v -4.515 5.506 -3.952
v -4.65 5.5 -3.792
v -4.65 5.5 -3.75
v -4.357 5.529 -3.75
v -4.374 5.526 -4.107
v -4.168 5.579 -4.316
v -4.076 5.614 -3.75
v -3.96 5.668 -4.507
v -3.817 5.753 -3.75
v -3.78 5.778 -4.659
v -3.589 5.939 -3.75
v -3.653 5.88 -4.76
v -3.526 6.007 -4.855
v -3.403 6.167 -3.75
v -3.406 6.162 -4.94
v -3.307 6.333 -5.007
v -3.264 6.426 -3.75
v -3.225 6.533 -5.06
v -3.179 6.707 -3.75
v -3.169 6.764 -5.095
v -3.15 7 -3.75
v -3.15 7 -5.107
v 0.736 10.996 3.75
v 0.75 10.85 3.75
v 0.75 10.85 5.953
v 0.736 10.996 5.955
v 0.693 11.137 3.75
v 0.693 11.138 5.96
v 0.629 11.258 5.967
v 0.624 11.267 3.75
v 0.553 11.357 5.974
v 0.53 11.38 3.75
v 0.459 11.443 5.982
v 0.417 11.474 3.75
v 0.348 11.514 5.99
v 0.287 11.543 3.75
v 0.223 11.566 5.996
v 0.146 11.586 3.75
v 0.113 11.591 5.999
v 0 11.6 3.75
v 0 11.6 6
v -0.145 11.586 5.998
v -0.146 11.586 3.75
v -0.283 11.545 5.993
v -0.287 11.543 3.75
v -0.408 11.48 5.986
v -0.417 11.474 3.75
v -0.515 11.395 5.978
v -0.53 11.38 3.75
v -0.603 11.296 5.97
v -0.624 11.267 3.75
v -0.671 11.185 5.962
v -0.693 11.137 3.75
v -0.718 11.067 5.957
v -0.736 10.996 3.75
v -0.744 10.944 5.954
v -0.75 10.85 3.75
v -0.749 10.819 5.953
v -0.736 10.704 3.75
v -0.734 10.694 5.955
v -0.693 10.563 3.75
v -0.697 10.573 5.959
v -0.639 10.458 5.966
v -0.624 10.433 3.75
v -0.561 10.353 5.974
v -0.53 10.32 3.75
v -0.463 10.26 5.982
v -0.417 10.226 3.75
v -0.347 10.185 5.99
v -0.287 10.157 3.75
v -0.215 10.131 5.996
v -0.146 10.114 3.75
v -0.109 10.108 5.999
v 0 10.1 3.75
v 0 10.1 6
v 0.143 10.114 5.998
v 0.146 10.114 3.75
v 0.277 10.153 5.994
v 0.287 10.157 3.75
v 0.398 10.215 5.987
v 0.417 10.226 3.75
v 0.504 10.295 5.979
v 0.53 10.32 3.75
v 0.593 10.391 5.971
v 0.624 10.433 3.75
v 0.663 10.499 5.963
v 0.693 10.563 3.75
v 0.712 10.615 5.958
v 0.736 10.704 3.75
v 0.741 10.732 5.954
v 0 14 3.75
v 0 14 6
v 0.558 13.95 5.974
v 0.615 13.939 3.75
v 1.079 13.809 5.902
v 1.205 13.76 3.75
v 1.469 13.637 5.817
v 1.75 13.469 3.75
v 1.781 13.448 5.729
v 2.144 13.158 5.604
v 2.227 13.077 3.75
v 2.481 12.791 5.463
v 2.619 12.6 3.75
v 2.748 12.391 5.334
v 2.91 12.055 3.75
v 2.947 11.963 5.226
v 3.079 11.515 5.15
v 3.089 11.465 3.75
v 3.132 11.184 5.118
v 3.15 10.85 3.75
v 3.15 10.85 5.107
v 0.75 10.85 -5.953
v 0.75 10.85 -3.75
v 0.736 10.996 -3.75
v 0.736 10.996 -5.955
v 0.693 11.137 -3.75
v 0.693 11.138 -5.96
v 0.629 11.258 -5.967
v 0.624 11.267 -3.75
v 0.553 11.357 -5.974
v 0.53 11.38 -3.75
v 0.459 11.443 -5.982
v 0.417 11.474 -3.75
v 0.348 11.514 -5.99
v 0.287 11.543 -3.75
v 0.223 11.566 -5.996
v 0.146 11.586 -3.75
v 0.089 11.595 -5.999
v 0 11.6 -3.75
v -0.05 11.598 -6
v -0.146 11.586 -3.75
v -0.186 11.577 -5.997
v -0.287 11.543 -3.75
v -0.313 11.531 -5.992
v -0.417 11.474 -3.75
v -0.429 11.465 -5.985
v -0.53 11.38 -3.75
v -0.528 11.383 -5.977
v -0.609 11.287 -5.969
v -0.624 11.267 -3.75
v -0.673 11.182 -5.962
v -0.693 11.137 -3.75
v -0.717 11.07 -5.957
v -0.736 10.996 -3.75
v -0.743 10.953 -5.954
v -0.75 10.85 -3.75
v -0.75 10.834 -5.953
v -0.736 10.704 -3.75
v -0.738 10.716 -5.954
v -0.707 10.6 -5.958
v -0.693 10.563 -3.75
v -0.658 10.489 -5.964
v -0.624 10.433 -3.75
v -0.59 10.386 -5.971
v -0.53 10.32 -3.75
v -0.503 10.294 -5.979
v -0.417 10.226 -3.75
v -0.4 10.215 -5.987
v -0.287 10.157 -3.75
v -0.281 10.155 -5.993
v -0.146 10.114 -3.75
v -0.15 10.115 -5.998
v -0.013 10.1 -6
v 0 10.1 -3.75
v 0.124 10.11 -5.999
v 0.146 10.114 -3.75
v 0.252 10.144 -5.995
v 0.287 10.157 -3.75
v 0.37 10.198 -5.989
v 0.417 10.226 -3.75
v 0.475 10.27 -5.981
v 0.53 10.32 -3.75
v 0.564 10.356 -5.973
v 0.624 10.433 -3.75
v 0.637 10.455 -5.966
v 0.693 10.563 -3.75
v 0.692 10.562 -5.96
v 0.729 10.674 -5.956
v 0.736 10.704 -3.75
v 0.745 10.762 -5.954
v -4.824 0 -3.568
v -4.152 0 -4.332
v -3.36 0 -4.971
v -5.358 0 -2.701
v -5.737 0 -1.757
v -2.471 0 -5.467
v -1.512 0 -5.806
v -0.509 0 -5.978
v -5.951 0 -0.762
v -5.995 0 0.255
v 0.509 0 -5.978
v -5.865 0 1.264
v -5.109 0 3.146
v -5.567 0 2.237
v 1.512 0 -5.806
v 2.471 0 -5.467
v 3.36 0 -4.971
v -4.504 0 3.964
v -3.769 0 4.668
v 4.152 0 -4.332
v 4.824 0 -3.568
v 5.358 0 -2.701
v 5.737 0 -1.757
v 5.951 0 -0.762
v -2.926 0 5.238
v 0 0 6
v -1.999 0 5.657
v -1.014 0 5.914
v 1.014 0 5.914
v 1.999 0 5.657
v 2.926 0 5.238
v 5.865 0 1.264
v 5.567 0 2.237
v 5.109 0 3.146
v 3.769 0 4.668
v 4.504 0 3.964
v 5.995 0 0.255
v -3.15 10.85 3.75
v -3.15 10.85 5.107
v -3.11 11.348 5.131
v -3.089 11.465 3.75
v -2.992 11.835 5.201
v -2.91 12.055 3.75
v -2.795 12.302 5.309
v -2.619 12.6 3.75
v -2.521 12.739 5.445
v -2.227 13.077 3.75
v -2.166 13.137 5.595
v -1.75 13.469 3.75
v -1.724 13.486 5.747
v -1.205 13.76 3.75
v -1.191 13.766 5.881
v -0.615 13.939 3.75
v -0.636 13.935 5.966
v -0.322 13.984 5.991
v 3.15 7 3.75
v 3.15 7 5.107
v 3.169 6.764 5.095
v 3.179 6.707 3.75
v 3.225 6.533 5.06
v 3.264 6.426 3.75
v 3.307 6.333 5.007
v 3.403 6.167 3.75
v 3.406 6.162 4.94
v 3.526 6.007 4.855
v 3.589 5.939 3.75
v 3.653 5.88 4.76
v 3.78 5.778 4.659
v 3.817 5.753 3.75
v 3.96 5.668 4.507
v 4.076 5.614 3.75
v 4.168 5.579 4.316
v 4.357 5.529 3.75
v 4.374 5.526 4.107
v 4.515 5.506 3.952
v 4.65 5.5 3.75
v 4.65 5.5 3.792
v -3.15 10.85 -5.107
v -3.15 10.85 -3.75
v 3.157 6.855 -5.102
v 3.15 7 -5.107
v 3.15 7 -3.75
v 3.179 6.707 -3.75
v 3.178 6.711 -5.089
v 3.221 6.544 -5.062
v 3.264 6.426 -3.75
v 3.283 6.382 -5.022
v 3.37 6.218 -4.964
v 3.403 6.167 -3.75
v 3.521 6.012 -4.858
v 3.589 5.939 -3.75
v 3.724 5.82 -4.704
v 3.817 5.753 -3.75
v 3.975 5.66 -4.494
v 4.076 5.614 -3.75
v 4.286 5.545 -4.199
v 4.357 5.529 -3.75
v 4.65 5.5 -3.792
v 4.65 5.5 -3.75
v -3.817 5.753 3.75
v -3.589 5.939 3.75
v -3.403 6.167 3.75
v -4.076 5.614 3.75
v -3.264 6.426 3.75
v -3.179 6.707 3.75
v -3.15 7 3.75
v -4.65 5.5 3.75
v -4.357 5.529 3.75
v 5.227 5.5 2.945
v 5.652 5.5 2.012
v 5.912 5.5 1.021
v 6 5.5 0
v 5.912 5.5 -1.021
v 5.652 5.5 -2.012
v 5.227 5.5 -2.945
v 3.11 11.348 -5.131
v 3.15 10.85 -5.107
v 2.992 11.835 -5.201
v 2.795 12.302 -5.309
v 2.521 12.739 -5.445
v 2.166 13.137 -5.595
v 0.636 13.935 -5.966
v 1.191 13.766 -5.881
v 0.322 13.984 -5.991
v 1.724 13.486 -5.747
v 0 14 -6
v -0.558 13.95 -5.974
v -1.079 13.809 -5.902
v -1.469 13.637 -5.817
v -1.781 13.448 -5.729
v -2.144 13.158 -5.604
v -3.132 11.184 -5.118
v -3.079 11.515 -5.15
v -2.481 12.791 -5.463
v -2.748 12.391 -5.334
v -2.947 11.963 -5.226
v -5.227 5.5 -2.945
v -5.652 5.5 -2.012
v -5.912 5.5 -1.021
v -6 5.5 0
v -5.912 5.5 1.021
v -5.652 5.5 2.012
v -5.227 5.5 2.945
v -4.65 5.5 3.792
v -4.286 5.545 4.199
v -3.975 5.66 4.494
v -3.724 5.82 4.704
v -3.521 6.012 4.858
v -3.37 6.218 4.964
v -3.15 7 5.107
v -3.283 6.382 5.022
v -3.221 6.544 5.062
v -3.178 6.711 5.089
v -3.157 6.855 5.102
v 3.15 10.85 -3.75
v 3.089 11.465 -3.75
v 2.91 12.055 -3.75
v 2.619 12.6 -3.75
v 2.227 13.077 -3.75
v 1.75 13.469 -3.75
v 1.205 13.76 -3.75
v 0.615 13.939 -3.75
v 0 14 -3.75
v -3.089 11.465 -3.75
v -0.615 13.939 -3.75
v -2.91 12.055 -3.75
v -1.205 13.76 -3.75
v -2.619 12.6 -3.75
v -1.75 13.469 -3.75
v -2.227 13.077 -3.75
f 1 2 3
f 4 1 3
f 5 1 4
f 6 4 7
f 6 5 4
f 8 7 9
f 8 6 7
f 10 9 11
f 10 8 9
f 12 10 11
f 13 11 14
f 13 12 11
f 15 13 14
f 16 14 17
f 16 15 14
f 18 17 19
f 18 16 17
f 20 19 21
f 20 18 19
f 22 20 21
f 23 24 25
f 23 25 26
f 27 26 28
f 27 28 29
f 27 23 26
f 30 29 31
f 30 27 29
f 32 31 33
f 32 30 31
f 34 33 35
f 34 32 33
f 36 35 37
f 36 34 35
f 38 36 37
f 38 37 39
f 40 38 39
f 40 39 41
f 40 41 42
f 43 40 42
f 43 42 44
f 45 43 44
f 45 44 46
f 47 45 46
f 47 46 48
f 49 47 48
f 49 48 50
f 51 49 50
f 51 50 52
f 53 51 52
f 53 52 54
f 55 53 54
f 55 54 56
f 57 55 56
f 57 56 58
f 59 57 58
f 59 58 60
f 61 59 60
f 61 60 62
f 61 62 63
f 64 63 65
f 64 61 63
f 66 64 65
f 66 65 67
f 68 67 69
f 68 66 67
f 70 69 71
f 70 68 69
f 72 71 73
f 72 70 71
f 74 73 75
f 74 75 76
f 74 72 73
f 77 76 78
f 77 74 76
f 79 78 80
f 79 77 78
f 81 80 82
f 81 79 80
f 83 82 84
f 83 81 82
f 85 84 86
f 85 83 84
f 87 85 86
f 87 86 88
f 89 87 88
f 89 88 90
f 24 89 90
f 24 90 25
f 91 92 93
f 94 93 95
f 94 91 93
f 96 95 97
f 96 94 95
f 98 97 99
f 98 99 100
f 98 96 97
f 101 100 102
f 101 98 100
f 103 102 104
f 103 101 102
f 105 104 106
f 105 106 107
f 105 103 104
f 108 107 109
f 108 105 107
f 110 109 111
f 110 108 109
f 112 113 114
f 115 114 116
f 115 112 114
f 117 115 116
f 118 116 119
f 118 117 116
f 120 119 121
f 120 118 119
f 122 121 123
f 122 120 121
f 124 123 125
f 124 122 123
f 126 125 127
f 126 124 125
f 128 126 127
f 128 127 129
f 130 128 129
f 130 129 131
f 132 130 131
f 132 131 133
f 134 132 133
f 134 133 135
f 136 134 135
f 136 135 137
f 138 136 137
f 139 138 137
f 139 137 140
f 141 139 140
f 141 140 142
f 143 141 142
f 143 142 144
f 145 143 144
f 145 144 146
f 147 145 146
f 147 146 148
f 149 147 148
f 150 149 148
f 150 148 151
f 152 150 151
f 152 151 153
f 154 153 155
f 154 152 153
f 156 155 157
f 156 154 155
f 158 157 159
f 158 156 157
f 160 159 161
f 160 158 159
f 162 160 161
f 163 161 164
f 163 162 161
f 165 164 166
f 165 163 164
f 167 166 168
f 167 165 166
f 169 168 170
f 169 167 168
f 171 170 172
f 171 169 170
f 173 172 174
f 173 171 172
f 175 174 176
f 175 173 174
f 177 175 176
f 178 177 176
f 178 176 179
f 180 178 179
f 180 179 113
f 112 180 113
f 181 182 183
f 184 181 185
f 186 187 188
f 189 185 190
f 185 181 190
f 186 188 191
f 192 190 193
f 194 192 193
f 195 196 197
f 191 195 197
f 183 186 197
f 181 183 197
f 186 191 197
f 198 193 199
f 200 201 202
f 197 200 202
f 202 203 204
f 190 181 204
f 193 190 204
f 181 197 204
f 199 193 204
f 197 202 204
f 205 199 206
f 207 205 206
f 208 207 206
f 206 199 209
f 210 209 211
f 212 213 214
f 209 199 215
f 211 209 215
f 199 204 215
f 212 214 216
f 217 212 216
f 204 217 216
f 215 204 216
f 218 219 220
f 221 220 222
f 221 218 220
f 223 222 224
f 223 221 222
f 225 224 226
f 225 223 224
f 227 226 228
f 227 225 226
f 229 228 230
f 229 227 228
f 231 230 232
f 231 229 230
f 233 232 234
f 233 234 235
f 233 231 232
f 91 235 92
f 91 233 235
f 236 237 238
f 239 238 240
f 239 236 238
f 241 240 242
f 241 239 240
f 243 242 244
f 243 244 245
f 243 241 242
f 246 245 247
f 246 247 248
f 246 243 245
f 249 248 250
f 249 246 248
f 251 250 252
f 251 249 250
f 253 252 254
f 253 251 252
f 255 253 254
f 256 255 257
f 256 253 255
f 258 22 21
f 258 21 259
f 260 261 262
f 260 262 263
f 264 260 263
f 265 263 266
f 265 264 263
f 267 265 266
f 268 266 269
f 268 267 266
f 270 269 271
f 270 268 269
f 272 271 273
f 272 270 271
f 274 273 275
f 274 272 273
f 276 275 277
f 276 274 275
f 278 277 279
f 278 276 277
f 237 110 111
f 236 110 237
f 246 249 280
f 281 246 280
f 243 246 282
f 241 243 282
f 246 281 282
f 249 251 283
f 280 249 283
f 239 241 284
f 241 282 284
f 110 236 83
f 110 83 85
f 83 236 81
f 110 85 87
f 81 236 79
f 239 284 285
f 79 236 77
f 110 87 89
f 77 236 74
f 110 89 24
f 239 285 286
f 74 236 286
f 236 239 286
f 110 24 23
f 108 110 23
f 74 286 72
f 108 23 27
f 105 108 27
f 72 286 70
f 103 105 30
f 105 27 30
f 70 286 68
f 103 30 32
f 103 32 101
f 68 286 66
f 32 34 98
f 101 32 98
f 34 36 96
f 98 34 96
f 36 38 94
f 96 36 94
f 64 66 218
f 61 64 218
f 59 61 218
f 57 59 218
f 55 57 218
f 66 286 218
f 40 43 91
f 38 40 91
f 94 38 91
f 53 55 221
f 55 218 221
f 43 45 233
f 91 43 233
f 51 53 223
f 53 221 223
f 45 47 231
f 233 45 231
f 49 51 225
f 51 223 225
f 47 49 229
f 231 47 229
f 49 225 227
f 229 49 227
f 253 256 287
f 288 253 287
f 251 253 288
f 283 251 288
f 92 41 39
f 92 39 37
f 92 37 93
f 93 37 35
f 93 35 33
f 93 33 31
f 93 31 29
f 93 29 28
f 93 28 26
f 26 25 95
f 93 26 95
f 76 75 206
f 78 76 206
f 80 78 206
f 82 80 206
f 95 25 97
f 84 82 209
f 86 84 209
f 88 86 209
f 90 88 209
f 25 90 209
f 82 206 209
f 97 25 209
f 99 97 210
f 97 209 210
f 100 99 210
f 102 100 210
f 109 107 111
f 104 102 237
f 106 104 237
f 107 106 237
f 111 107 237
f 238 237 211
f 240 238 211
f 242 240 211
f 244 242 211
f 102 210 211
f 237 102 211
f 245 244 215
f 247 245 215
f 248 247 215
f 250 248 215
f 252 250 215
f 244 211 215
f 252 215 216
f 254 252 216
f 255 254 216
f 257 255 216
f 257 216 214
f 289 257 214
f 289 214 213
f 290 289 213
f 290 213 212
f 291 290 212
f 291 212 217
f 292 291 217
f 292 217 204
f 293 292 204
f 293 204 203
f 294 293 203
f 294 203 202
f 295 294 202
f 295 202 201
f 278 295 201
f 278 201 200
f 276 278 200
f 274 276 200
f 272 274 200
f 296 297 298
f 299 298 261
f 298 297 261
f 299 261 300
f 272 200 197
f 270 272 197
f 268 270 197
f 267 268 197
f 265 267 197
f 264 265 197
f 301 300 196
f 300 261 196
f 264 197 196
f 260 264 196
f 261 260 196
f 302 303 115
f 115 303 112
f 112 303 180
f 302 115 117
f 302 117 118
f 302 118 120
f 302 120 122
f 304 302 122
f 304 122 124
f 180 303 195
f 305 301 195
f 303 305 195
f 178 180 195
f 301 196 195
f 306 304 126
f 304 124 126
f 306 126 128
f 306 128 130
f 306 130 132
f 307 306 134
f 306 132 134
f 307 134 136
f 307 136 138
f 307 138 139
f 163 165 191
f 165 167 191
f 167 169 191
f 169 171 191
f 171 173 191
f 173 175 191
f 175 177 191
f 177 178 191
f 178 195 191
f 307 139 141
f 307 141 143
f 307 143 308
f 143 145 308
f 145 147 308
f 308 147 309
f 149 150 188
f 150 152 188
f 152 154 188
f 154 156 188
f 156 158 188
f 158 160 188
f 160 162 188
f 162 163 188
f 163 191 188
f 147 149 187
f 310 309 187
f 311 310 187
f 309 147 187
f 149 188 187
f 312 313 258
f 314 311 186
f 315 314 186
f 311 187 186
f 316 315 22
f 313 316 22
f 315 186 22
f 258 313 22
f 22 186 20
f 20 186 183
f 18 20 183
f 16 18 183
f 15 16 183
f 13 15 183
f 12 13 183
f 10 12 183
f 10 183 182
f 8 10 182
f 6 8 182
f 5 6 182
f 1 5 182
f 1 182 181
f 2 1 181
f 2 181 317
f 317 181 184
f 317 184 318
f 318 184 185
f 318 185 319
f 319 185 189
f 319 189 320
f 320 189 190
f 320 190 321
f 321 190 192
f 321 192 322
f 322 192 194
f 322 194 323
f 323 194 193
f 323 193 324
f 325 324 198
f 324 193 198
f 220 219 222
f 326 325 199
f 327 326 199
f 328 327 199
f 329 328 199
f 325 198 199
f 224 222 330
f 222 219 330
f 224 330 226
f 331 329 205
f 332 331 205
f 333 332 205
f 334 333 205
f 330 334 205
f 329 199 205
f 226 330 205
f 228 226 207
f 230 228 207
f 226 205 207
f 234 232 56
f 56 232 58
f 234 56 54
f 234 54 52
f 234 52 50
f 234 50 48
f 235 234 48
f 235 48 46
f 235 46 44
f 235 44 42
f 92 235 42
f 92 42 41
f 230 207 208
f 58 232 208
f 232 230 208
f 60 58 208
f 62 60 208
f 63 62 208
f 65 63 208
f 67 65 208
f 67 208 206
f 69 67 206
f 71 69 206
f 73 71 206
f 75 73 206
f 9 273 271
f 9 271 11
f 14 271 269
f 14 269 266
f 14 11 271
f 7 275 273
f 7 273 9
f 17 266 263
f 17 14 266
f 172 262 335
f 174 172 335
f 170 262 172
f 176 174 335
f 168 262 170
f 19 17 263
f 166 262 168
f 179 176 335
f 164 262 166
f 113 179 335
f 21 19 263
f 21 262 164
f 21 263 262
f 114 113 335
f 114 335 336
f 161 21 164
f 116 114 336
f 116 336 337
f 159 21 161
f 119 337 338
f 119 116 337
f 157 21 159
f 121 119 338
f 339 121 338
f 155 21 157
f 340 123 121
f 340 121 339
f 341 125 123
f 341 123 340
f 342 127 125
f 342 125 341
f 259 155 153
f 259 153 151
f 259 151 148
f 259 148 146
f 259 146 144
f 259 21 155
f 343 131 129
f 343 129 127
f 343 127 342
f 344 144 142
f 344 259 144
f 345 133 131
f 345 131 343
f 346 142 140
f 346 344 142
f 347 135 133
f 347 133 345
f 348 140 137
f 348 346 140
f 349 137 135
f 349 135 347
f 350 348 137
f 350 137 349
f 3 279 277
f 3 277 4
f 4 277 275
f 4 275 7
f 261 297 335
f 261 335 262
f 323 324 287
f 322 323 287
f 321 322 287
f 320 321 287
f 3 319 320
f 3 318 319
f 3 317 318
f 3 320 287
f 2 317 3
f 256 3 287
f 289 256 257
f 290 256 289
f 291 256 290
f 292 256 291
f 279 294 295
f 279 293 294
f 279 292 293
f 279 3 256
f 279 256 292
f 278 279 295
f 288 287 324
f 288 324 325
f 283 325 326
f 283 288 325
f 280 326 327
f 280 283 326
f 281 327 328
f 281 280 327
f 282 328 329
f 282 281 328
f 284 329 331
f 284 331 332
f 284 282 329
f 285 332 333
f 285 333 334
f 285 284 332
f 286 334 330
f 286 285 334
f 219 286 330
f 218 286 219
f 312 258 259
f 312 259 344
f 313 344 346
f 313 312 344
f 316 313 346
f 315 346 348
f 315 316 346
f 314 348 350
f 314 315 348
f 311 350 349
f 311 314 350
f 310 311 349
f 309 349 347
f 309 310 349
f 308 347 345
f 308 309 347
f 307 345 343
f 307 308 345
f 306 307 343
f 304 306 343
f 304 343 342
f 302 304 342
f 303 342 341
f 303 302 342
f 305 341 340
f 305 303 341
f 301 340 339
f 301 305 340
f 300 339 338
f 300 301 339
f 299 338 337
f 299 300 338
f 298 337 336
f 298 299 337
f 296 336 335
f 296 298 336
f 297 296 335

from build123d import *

# Parameters (mm, degrees)
SKETCH1_R               = 6
BOSS_EXTRUDE1_DEPTH     = 14
CUT_EXTRUDE1_DEPTH      = 17.370705544
CUT_EXTRUDE1_DEPTH_BACK = 17.370705544
SKETCH2_W               = 7.5
SKETCH2_H               = 8.5
CUT_EXTRUDE2_DEPTH      = 17.370705544
CUT_EXTRUDE2_DEPTH_BACK = 17.370705544
SKETCH3_R               = 0.75


with BuildPart() as part:
    # Sketch1 → Boss-Extrude1 (new body)
    with BuildSketch(Plane(origin=(0, 0, 0), x_dir=(1, 0, 0), z_dir=(0, 1, 0))):
        with Locations(Location((0, 0, 0), (0, 0, 270))):
            Circle(SKETCH1_R)
    extrude(amount=BOSS_EXTRUDE1_DEPTH)

    # Sketch2 → Cut-Extrude1 (cut, two sides: drawn at the far end of the back side and taken through both)
    with BuildSketch(Plane(origin=(0, 0, 0), x_dir=(0, 0, -1), z_dir=(1, 0, 0)).offset(-CUT_EXTRUDE1_DEPTH_BACK)):
        with Locations((0, 9.75)):
            Rectangle(SKETCH2_W, SKETCH2_H)
    extrude(amount=CUT_EXTRUDE1_DEPTH + CUT_EXTRUDE1_DEPTH_BACK, mode=Mode.SUBTRACT)

    # Sketch3 → Cut-Extrude2 (cut, two sides: drawn at the far end of the back side and taken through both)
    with BuildSketch(Plane.XY.offset(-CUT_EXTRUDE2_DEPTH_BACK)):
        with BuildLine():
            Line((-3.15, 7), (-3.15, 10.85))
            ThreePointArc((-3.15, 10.85), (-2.227386361, 13.077386361), (0, 14))
            Line((0, 14), (-4.683748499, 14))
            Line((-4.683748499, 14), (-4.683748499, 5.5))
            Line((-4.683748499, 5.5), (-4.65, 5.5))
            ThreePointArc((-4.65, 5.5), (-3.589339828, 5.939339828), (-3.15, 7))
        make_face()
        with BuildLine():
            Line((4.683748499, 14), (0, 14))
            ThreePointArc((0, 14), (2.227386361, 13.077386361), (3.15, 10.85))
            Line((3.15, 10.85), (3.15, 7))
            ThreePointArc((3.15, 7), (3.589339828, 5.939339828), (4.65, 5.5))
            Line((4.65, 5.5), (4.683748499, 5.5))
            Line((4.683748499, 5.5), (4.683748499, 14))
        make_face()
        with Locations((0, 10.85)):
            Circle(SKETCH3_R)
    extrude(amount=CUT_EXTRUDE2_DEPTH + CUT_EXTRUDE2_DEPTH_BACK, mode=Mode.SUBTRACT)


solid = part.part
